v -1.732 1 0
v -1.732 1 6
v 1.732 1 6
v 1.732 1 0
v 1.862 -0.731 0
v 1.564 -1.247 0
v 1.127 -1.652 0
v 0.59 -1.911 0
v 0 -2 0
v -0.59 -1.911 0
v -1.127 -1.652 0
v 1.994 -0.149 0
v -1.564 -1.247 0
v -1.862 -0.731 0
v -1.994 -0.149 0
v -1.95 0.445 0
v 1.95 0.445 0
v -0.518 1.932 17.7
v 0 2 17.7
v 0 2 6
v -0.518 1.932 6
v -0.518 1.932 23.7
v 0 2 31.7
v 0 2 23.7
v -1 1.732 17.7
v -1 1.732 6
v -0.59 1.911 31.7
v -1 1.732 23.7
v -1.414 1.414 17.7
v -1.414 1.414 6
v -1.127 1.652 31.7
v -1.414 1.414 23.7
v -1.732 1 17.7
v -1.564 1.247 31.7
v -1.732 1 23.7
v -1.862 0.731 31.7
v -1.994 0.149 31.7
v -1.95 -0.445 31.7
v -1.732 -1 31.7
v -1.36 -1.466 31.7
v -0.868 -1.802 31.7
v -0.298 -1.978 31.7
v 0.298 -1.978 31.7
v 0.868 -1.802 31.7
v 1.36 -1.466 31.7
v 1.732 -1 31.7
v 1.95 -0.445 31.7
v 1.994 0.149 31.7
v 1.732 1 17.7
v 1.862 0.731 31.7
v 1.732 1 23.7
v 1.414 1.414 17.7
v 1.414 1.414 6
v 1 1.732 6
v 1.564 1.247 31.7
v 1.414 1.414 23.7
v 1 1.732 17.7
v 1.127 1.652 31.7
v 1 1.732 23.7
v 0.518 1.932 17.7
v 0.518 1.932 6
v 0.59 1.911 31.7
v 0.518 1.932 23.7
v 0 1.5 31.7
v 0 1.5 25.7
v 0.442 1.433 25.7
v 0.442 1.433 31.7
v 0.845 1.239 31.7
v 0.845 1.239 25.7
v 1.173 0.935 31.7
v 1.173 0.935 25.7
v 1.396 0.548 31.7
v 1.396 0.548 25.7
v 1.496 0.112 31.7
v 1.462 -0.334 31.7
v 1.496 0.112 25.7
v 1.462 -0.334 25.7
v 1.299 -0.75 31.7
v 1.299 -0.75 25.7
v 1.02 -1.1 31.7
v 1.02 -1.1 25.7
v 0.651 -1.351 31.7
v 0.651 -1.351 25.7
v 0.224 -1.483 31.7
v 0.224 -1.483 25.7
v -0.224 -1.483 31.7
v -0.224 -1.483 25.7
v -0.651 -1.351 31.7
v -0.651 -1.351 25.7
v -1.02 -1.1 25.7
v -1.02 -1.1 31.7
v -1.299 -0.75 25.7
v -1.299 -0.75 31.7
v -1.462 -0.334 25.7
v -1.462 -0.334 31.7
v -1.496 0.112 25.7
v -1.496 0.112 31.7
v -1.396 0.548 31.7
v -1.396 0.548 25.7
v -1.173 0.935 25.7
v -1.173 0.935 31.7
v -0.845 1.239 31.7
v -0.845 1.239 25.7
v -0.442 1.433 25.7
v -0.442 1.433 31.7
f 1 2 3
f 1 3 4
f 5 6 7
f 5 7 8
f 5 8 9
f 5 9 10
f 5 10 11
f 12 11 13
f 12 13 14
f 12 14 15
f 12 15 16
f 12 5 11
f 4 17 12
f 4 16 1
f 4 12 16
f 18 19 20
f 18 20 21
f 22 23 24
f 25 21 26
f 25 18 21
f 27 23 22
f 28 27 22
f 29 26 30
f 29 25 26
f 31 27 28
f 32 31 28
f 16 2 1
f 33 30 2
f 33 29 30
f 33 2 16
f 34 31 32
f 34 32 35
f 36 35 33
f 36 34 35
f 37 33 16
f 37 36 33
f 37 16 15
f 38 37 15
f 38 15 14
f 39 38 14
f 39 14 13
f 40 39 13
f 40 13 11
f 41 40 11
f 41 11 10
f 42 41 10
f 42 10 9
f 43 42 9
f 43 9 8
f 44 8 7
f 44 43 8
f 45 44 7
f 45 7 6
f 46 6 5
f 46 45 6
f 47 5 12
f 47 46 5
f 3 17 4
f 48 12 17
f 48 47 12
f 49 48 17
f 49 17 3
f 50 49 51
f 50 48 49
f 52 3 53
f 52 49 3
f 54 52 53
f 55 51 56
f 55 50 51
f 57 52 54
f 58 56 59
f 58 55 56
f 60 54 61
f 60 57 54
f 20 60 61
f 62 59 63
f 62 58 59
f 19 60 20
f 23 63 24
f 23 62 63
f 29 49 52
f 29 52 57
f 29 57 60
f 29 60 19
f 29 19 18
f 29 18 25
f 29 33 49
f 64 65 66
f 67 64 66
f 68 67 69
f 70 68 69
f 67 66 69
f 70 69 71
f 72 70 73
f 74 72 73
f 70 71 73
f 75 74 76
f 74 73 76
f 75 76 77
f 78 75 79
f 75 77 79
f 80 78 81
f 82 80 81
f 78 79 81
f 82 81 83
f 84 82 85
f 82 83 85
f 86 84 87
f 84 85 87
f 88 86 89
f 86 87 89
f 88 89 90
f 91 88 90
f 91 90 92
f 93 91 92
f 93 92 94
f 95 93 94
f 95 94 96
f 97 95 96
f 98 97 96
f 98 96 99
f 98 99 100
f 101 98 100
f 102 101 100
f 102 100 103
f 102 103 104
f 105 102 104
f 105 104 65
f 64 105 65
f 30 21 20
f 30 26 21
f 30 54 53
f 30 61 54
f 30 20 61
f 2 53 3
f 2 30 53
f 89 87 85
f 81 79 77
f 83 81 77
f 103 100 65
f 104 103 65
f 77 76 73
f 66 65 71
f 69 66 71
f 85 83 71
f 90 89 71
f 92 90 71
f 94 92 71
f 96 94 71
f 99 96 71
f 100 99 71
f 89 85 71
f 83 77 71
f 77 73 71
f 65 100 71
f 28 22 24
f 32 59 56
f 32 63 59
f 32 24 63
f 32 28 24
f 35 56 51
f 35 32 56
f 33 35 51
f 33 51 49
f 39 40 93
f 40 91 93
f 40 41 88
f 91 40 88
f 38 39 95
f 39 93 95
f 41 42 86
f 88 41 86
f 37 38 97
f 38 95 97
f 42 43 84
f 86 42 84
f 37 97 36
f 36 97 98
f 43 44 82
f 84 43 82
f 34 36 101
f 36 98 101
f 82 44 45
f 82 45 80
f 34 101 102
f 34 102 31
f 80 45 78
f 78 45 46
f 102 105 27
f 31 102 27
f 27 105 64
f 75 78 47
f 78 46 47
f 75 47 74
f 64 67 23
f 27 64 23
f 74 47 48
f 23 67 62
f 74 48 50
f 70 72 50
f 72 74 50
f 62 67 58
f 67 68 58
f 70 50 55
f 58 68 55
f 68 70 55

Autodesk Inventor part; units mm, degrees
ref_plane "YZ Plane" through (0, 0, 0) normal (1, 0, 0) x (0, 1, 0)
ref_plane "XZ Plane" through (0, 0, 0) normal (0, 1, 0) x (-1, 0, 0)
ref_plane "XY Plane" through (0, 0, 0) normal (0, 0, 1) x (1, 0, 0)
sketch "スケッチ1" plane through (0, 0, 0) normal (1, 0, 0) x (0, 1, 0)
  line L0 (0, 0) -> (2, 0)
  line L1 (2, 0) -> (2, 31.7)
  line L2 (2, 31.7) -> (1.5, 31.7)
  line L3 (1.5, 31.7) -> (1.5, 25.7)
  line L4 (1.5, 25.7) -> (0, 25.7)
  line L5 (0, 25.7) -> (0, 0)
  dimension "d0" = 2
  dimension "d1" = 31.7
  dimension "d2" = 0.5
  dimension "d3" = 6
revolve "回転1" add sketch "スケッチ1" angle 360 about axis through (0, 0, 25.7) along (0, 0, -1)
thread "ねじ1" size "M3x0.5" class "6H" standard "ANSI Metric M Profile" full length
sketch "スケッチ2" plane through (0, 0, 0) normal (1, 0, 0) x (0, 1, 0)
  line L0 (2, 31.7) -> (2, 0) projected
  line L1 (2, 0) -> (2, 6)
  line L2 (2, 6) -> (1, 6)
  line L3 (1, 6) -> (1, 0)
  line L4 (-2, 0) -> (2, 0) projected
  line L5 (1, 0) -> (2, 0)
  point P0 (0, 0)
  dimension "d7" = 6
  dimension "d8" = 1
extrude "押し出し1" cut sketch "スケッチ2" along normal mid plane 6
sketch "スケッチ3" plane through (0, 0, 0) normal (1, 0, 0) x (0, 1, 0)
  line L0 (2, 31.7) -> (2, 6) projected
  line L1 (2, 20.7) -> (2, 23.7)
  line L2 (2, 23.7) -> (1, 23.7)
  line L3 (1, 23.7) -> (1, 17.7)
  line L4 (1, 17.7) -> (2, 17.7)
  line L5 (2, 17.7) -> (2, 20.7)
  point P0 (0, 0)
  dimension "d11" = 3
  dimension "d12" = 1
  dimension "d13" = 6
extrude "押し出し2" cut sketch "スケッチ3" along normal mid plane 6
properties part number "shaft_31.7mm_Dcut" material "アルミニウム"
